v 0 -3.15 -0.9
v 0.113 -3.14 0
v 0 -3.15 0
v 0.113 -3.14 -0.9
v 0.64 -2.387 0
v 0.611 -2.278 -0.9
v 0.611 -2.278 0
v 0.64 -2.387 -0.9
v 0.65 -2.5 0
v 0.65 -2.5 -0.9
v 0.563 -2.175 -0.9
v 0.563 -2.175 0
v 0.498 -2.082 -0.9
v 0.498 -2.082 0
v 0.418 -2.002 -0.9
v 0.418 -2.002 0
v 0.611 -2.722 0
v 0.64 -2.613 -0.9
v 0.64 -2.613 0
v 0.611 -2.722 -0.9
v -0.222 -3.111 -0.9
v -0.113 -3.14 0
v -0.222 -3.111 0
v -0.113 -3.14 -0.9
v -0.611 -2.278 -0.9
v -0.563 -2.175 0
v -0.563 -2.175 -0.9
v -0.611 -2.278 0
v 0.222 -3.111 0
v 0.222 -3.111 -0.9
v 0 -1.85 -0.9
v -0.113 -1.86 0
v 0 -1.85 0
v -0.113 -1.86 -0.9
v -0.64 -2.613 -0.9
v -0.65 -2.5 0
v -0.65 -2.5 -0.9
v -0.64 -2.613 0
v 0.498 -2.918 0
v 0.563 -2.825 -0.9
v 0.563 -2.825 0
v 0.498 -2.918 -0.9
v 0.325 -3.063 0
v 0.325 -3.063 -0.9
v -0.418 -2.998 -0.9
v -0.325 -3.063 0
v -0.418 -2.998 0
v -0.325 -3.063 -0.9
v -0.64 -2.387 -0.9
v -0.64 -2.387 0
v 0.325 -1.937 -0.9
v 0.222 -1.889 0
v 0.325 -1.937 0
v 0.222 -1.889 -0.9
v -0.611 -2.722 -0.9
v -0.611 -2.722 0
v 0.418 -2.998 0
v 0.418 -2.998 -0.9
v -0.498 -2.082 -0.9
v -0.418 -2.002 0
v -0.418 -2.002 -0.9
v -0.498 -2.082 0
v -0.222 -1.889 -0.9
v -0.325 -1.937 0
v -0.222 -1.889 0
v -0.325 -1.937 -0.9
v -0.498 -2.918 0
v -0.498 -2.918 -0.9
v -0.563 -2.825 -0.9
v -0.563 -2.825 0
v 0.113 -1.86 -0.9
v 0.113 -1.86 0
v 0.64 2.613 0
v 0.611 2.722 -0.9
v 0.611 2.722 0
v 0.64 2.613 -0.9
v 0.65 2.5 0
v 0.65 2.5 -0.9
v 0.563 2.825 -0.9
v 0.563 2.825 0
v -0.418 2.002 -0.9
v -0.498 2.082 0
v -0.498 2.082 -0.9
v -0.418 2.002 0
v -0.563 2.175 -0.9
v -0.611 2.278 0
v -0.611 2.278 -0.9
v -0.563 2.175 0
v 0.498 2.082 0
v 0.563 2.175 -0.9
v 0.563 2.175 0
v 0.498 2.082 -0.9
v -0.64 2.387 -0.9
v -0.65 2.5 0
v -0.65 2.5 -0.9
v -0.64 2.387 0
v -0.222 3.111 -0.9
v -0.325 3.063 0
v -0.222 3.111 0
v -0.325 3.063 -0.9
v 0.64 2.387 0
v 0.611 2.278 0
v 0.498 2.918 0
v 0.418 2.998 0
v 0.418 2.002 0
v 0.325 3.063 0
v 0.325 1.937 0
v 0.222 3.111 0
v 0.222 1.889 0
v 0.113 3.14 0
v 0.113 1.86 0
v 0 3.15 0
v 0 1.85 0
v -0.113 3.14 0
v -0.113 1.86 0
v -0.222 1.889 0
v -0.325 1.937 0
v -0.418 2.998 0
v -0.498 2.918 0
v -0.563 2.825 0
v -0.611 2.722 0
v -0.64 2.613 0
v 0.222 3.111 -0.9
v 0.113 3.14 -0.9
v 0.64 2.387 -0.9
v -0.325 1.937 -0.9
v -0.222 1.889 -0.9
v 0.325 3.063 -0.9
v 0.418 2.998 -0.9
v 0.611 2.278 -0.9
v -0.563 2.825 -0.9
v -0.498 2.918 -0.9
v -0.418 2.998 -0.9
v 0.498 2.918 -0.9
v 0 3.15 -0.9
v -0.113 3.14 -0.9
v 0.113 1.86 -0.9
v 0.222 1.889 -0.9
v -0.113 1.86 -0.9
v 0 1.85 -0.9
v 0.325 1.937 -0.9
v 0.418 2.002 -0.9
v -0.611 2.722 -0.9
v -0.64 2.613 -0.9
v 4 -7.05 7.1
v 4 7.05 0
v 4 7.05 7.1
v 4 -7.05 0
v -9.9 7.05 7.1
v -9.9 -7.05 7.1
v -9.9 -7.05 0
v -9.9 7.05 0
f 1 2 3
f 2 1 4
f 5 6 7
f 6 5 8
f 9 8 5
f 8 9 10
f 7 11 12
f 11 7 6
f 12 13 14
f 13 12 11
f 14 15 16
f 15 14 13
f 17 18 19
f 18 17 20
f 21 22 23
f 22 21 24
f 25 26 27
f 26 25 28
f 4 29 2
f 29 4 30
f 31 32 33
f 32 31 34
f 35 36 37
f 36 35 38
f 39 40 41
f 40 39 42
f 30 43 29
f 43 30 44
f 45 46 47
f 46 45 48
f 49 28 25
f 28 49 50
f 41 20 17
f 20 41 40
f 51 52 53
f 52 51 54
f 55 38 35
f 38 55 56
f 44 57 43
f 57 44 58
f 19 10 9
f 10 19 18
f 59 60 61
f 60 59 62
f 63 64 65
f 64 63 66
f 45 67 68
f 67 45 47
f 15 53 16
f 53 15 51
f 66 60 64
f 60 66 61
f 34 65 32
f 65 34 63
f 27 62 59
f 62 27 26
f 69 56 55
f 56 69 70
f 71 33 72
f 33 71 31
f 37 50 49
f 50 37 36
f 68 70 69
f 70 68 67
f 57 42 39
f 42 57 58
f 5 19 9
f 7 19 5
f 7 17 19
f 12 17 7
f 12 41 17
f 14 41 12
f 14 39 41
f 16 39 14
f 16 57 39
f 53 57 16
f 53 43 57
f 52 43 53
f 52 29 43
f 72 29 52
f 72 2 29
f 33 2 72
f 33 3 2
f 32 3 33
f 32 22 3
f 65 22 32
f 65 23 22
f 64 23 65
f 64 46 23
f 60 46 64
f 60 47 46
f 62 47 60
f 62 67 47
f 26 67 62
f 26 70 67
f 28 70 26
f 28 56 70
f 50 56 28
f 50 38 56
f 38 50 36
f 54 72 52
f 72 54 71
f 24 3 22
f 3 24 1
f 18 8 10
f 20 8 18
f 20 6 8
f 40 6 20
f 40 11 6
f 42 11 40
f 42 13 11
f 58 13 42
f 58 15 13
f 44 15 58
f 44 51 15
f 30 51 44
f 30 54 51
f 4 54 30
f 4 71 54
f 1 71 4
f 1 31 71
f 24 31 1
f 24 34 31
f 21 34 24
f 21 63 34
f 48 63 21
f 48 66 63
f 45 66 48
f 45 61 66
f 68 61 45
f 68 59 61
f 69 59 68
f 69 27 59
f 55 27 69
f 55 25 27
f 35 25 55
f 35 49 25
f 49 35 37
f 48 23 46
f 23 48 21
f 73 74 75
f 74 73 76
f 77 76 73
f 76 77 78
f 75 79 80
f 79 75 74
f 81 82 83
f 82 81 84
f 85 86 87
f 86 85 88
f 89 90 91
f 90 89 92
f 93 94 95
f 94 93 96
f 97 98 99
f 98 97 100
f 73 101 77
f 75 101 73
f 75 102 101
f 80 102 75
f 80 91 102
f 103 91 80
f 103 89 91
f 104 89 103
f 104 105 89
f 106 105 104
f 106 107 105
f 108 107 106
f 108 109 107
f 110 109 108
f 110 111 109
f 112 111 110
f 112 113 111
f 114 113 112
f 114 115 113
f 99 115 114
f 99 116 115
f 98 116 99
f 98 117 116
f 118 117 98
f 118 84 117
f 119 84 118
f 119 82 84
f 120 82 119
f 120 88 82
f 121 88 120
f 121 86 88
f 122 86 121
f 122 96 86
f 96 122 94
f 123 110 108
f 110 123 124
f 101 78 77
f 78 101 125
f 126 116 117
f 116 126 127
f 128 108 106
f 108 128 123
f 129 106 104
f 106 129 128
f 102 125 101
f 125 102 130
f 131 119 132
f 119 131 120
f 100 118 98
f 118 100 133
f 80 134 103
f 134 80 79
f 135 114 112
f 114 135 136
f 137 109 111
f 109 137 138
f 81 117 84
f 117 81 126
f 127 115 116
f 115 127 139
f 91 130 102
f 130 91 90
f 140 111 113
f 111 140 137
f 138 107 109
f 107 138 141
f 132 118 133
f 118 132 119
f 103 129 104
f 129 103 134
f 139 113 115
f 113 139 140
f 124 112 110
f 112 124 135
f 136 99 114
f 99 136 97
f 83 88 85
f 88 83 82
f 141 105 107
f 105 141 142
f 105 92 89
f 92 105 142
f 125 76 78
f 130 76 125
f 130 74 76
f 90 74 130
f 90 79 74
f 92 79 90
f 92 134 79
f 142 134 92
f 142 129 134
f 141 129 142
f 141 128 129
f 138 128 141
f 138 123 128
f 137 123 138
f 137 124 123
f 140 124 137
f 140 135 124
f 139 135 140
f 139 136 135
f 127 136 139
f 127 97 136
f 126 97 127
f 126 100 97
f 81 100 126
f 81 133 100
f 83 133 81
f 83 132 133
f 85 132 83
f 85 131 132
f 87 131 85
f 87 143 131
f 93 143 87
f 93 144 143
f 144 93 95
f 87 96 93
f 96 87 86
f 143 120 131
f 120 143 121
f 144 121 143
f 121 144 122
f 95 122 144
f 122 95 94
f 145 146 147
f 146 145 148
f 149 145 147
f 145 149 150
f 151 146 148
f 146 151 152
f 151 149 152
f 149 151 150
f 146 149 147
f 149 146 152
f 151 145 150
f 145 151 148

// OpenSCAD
t = 3;
l = 0.005 * 25.4;

digit_height = 25;
grid_plate_gutter_w = 2;
// hex_height = digit_height/5

module pcb() {
  
}

module usb_port() {
  color([128/255, 128/255, 128/255]) union() {
    translate([0, 0, -0.9/2]) for (y=[-1,1]) {
      translate([0, y * 2.5, 0]) cylinder(r=1.3/2, h=0.9, center=true, $fn=36);
    }
    translate([-9.9 + 13.9 / 2, 0, 7.1/2]) cube(size=[13.9, 14.1, 7.1], center=true);
  }
}

module back_plate() {
  
}

module face_plate() {

}

module grid_plate() {
  
}

usb_port();
